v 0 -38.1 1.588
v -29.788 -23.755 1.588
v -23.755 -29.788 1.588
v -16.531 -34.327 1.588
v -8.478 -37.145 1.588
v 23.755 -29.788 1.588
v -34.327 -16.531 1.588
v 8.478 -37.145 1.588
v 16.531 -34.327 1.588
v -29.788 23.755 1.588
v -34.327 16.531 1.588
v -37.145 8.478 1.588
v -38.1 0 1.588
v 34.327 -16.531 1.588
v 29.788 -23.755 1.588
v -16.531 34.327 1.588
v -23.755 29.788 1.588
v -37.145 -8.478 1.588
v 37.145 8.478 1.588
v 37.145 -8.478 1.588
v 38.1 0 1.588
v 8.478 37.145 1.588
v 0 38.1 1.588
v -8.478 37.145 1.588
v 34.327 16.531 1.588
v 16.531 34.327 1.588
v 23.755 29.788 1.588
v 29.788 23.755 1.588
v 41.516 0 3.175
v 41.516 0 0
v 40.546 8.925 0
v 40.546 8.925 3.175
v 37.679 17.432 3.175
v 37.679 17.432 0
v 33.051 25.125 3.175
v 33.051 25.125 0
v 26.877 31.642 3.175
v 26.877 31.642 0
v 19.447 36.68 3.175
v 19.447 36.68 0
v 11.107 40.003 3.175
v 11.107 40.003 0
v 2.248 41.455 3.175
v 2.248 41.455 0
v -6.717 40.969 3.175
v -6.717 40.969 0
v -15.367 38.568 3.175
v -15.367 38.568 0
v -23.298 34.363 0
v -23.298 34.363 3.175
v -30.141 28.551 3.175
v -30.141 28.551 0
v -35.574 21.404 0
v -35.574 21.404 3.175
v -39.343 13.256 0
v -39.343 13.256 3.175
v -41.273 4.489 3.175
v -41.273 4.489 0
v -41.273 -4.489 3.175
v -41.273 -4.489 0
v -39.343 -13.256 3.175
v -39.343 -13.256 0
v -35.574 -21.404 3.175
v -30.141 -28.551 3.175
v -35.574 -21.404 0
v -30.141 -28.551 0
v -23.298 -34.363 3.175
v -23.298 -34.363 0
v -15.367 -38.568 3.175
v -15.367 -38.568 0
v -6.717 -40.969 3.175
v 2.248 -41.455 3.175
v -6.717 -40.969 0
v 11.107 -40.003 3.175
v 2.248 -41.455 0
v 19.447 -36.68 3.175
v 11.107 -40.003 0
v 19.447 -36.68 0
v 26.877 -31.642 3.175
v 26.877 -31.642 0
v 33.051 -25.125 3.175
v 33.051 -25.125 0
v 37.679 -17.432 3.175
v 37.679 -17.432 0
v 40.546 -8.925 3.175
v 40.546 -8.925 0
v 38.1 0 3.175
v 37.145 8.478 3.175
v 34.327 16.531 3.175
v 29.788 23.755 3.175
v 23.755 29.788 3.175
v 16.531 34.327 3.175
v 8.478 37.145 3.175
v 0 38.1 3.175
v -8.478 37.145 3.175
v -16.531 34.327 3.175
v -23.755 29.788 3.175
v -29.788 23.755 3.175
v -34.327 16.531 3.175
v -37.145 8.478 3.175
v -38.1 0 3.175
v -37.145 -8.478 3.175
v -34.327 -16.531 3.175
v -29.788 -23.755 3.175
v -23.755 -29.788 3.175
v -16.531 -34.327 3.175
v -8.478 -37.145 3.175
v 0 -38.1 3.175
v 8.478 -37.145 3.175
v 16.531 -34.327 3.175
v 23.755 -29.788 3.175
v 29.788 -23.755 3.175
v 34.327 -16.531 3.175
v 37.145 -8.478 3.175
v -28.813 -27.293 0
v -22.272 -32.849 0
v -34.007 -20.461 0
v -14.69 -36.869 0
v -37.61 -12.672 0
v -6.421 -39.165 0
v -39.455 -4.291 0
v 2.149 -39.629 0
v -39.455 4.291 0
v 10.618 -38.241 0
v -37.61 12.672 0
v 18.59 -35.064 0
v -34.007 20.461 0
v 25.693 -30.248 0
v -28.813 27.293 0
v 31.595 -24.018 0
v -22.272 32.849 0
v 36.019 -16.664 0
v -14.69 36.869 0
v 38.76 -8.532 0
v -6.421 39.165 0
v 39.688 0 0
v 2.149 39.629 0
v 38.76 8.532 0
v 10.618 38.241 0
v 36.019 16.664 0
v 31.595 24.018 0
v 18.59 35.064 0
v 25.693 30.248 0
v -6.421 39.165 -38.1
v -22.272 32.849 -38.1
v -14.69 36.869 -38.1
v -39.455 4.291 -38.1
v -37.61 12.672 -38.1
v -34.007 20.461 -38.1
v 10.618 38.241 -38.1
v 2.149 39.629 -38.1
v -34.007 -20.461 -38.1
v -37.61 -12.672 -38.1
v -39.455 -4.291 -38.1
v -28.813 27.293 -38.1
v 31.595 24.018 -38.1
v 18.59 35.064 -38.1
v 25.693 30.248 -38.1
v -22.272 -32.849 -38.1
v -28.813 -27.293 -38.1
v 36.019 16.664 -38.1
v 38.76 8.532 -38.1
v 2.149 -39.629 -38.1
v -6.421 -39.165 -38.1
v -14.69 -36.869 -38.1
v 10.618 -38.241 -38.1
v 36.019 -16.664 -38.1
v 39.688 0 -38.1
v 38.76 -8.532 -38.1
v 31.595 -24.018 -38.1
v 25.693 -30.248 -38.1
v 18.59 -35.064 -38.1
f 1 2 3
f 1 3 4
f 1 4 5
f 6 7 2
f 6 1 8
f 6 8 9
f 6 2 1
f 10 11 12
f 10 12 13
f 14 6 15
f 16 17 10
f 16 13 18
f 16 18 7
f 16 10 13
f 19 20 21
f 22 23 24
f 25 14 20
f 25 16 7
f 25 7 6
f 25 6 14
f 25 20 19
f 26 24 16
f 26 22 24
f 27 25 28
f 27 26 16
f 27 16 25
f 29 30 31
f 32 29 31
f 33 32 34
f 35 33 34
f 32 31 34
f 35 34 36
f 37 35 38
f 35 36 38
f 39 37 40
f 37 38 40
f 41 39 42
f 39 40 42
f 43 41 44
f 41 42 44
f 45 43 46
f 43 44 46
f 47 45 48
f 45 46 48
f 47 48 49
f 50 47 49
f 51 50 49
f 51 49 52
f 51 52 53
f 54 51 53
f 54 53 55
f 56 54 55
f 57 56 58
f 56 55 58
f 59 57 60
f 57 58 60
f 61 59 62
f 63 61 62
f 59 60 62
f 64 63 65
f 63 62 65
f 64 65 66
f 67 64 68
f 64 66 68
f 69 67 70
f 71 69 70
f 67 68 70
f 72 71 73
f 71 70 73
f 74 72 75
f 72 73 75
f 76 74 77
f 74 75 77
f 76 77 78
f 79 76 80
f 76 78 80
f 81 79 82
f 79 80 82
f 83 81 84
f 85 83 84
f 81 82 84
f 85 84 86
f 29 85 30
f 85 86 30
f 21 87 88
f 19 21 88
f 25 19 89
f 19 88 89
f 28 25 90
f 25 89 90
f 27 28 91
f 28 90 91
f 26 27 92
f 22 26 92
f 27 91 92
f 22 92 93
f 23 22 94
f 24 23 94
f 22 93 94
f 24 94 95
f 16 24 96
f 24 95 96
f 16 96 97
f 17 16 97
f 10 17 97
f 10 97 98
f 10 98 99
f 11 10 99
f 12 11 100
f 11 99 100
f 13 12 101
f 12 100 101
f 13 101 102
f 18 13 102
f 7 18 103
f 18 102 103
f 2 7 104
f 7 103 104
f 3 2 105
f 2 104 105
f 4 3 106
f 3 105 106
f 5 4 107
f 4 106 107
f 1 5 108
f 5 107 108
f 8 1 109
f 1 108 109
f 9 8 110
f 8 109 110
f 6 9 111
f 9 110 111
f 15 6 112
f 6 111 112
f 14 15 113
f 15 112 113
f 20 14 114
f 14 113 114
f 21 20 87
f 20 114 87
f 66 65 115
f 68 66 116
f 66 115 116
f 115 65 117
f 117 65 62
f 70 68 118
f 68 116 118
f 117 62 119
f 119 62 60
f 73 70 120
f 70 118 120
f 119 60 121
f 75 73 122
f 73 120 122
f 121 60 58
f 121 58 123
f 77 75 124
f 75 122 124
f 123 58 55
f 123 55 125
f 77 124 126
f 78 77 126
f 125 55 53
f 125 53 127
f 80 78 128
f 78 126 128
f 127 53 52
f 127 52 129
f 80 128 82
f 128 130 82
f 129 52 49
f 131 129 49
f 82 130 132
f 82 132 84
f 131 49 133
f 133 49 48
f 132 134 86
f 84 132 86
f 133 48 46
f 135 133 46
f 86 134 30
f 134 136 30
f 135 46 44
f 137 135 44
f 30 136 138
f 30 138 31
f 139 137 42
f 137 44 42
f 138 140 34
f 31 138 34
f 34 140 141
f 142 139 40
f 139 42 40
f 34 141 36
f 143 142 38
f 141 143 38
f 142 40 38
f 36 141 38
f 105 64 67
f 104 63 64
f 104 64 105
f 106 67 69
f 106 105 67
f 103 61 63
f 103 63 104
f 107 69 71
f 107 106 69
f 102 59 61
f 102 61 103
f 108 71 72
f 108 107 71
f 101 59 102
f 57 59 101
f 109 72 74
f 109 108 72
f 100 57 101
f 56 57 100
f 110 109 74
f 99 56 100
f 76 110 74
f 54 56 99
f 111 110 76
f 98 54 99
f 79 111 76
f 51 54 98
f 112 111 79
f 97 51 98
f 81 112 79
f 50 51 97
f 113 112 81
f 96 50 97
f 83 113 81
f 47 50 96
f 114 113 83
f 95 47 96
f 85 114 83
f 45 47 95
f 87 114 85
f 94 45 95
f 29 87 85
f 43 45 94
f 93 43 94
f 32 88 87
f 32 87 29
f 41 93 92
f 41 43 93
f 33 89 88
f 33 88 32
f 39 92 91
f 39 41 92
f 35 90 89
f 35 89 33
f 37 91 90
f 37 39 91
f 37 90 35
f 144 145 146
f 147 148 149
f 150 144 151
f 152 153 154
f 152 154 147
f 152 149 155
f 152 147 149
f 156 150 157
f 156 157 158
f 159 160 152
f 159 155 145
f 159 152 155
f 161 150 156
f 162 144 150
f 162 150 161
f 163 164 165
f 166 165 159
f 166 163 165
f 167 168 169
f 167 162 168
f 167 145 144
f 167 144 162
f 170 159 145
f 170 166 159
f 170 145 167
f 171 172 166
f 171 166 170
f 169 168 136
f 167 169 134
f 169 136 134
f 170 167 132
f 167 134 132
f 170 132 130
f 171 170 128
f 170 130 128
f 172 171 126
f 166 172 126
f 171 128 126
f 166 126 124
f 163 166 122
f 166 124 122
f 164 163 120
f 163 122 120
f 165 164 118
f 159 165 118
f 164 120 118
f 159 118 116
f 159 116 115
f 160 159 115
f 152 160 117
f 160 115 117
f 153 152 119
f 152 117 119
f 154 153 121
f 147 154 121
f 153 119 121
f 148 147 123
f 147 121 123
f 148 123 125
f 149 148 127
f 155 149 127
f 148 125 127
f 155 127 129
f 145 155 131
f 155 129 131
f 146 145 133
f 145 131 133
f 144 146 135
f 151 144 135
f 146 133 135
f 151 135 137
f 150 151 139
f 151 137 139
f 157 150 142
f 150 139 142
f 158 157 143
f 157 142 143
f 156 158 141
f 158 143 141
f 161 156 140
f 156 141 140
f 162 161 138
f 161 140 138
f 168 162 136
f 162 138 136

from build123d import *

# Parameters (mm, degrees)
SKETCH1_R           = 41.5163
BOSS_EXTRUDE1_DEPTH = 3.175
SKETCH2_R           = 39.6875
BOSS_EXTRUDE2_DEPTH = 38.1
SKETCH3_R           = 38.1
CUT_EXTRUDE1_DEPTH  = 1.5875


with BuildPart() as part:
    # Sketch1 → Boss-Extrude1 (new body)
    with BuildSketch(Plane.XY):
        Circle(SKETCH1_R)
    extrude(amount=BOSS_EXTRUDE1_DEPTH)

    # Sketch2 → Boss-Extrude2 (add)
    with BuildSketch(Plane(origin=(0, 0, 0), x_dir=(-1, 0, 0), z_dir=(0, 0, -1))):
        Circle(SKETCH2_R)
    extrude(amount=BOSS_EXTRUDE2_DEPTH)

    # Sketch3 → Cut-Extrude1 (cut)
    with BuildSketch(Plane.XY.offset(3.175)):
        Circle(SKETCH3_R)
    extrude(amount=-CUT_EXTRUDE1_DEPTH, mode=Mode.SUBTRACT)


solid = part.part
